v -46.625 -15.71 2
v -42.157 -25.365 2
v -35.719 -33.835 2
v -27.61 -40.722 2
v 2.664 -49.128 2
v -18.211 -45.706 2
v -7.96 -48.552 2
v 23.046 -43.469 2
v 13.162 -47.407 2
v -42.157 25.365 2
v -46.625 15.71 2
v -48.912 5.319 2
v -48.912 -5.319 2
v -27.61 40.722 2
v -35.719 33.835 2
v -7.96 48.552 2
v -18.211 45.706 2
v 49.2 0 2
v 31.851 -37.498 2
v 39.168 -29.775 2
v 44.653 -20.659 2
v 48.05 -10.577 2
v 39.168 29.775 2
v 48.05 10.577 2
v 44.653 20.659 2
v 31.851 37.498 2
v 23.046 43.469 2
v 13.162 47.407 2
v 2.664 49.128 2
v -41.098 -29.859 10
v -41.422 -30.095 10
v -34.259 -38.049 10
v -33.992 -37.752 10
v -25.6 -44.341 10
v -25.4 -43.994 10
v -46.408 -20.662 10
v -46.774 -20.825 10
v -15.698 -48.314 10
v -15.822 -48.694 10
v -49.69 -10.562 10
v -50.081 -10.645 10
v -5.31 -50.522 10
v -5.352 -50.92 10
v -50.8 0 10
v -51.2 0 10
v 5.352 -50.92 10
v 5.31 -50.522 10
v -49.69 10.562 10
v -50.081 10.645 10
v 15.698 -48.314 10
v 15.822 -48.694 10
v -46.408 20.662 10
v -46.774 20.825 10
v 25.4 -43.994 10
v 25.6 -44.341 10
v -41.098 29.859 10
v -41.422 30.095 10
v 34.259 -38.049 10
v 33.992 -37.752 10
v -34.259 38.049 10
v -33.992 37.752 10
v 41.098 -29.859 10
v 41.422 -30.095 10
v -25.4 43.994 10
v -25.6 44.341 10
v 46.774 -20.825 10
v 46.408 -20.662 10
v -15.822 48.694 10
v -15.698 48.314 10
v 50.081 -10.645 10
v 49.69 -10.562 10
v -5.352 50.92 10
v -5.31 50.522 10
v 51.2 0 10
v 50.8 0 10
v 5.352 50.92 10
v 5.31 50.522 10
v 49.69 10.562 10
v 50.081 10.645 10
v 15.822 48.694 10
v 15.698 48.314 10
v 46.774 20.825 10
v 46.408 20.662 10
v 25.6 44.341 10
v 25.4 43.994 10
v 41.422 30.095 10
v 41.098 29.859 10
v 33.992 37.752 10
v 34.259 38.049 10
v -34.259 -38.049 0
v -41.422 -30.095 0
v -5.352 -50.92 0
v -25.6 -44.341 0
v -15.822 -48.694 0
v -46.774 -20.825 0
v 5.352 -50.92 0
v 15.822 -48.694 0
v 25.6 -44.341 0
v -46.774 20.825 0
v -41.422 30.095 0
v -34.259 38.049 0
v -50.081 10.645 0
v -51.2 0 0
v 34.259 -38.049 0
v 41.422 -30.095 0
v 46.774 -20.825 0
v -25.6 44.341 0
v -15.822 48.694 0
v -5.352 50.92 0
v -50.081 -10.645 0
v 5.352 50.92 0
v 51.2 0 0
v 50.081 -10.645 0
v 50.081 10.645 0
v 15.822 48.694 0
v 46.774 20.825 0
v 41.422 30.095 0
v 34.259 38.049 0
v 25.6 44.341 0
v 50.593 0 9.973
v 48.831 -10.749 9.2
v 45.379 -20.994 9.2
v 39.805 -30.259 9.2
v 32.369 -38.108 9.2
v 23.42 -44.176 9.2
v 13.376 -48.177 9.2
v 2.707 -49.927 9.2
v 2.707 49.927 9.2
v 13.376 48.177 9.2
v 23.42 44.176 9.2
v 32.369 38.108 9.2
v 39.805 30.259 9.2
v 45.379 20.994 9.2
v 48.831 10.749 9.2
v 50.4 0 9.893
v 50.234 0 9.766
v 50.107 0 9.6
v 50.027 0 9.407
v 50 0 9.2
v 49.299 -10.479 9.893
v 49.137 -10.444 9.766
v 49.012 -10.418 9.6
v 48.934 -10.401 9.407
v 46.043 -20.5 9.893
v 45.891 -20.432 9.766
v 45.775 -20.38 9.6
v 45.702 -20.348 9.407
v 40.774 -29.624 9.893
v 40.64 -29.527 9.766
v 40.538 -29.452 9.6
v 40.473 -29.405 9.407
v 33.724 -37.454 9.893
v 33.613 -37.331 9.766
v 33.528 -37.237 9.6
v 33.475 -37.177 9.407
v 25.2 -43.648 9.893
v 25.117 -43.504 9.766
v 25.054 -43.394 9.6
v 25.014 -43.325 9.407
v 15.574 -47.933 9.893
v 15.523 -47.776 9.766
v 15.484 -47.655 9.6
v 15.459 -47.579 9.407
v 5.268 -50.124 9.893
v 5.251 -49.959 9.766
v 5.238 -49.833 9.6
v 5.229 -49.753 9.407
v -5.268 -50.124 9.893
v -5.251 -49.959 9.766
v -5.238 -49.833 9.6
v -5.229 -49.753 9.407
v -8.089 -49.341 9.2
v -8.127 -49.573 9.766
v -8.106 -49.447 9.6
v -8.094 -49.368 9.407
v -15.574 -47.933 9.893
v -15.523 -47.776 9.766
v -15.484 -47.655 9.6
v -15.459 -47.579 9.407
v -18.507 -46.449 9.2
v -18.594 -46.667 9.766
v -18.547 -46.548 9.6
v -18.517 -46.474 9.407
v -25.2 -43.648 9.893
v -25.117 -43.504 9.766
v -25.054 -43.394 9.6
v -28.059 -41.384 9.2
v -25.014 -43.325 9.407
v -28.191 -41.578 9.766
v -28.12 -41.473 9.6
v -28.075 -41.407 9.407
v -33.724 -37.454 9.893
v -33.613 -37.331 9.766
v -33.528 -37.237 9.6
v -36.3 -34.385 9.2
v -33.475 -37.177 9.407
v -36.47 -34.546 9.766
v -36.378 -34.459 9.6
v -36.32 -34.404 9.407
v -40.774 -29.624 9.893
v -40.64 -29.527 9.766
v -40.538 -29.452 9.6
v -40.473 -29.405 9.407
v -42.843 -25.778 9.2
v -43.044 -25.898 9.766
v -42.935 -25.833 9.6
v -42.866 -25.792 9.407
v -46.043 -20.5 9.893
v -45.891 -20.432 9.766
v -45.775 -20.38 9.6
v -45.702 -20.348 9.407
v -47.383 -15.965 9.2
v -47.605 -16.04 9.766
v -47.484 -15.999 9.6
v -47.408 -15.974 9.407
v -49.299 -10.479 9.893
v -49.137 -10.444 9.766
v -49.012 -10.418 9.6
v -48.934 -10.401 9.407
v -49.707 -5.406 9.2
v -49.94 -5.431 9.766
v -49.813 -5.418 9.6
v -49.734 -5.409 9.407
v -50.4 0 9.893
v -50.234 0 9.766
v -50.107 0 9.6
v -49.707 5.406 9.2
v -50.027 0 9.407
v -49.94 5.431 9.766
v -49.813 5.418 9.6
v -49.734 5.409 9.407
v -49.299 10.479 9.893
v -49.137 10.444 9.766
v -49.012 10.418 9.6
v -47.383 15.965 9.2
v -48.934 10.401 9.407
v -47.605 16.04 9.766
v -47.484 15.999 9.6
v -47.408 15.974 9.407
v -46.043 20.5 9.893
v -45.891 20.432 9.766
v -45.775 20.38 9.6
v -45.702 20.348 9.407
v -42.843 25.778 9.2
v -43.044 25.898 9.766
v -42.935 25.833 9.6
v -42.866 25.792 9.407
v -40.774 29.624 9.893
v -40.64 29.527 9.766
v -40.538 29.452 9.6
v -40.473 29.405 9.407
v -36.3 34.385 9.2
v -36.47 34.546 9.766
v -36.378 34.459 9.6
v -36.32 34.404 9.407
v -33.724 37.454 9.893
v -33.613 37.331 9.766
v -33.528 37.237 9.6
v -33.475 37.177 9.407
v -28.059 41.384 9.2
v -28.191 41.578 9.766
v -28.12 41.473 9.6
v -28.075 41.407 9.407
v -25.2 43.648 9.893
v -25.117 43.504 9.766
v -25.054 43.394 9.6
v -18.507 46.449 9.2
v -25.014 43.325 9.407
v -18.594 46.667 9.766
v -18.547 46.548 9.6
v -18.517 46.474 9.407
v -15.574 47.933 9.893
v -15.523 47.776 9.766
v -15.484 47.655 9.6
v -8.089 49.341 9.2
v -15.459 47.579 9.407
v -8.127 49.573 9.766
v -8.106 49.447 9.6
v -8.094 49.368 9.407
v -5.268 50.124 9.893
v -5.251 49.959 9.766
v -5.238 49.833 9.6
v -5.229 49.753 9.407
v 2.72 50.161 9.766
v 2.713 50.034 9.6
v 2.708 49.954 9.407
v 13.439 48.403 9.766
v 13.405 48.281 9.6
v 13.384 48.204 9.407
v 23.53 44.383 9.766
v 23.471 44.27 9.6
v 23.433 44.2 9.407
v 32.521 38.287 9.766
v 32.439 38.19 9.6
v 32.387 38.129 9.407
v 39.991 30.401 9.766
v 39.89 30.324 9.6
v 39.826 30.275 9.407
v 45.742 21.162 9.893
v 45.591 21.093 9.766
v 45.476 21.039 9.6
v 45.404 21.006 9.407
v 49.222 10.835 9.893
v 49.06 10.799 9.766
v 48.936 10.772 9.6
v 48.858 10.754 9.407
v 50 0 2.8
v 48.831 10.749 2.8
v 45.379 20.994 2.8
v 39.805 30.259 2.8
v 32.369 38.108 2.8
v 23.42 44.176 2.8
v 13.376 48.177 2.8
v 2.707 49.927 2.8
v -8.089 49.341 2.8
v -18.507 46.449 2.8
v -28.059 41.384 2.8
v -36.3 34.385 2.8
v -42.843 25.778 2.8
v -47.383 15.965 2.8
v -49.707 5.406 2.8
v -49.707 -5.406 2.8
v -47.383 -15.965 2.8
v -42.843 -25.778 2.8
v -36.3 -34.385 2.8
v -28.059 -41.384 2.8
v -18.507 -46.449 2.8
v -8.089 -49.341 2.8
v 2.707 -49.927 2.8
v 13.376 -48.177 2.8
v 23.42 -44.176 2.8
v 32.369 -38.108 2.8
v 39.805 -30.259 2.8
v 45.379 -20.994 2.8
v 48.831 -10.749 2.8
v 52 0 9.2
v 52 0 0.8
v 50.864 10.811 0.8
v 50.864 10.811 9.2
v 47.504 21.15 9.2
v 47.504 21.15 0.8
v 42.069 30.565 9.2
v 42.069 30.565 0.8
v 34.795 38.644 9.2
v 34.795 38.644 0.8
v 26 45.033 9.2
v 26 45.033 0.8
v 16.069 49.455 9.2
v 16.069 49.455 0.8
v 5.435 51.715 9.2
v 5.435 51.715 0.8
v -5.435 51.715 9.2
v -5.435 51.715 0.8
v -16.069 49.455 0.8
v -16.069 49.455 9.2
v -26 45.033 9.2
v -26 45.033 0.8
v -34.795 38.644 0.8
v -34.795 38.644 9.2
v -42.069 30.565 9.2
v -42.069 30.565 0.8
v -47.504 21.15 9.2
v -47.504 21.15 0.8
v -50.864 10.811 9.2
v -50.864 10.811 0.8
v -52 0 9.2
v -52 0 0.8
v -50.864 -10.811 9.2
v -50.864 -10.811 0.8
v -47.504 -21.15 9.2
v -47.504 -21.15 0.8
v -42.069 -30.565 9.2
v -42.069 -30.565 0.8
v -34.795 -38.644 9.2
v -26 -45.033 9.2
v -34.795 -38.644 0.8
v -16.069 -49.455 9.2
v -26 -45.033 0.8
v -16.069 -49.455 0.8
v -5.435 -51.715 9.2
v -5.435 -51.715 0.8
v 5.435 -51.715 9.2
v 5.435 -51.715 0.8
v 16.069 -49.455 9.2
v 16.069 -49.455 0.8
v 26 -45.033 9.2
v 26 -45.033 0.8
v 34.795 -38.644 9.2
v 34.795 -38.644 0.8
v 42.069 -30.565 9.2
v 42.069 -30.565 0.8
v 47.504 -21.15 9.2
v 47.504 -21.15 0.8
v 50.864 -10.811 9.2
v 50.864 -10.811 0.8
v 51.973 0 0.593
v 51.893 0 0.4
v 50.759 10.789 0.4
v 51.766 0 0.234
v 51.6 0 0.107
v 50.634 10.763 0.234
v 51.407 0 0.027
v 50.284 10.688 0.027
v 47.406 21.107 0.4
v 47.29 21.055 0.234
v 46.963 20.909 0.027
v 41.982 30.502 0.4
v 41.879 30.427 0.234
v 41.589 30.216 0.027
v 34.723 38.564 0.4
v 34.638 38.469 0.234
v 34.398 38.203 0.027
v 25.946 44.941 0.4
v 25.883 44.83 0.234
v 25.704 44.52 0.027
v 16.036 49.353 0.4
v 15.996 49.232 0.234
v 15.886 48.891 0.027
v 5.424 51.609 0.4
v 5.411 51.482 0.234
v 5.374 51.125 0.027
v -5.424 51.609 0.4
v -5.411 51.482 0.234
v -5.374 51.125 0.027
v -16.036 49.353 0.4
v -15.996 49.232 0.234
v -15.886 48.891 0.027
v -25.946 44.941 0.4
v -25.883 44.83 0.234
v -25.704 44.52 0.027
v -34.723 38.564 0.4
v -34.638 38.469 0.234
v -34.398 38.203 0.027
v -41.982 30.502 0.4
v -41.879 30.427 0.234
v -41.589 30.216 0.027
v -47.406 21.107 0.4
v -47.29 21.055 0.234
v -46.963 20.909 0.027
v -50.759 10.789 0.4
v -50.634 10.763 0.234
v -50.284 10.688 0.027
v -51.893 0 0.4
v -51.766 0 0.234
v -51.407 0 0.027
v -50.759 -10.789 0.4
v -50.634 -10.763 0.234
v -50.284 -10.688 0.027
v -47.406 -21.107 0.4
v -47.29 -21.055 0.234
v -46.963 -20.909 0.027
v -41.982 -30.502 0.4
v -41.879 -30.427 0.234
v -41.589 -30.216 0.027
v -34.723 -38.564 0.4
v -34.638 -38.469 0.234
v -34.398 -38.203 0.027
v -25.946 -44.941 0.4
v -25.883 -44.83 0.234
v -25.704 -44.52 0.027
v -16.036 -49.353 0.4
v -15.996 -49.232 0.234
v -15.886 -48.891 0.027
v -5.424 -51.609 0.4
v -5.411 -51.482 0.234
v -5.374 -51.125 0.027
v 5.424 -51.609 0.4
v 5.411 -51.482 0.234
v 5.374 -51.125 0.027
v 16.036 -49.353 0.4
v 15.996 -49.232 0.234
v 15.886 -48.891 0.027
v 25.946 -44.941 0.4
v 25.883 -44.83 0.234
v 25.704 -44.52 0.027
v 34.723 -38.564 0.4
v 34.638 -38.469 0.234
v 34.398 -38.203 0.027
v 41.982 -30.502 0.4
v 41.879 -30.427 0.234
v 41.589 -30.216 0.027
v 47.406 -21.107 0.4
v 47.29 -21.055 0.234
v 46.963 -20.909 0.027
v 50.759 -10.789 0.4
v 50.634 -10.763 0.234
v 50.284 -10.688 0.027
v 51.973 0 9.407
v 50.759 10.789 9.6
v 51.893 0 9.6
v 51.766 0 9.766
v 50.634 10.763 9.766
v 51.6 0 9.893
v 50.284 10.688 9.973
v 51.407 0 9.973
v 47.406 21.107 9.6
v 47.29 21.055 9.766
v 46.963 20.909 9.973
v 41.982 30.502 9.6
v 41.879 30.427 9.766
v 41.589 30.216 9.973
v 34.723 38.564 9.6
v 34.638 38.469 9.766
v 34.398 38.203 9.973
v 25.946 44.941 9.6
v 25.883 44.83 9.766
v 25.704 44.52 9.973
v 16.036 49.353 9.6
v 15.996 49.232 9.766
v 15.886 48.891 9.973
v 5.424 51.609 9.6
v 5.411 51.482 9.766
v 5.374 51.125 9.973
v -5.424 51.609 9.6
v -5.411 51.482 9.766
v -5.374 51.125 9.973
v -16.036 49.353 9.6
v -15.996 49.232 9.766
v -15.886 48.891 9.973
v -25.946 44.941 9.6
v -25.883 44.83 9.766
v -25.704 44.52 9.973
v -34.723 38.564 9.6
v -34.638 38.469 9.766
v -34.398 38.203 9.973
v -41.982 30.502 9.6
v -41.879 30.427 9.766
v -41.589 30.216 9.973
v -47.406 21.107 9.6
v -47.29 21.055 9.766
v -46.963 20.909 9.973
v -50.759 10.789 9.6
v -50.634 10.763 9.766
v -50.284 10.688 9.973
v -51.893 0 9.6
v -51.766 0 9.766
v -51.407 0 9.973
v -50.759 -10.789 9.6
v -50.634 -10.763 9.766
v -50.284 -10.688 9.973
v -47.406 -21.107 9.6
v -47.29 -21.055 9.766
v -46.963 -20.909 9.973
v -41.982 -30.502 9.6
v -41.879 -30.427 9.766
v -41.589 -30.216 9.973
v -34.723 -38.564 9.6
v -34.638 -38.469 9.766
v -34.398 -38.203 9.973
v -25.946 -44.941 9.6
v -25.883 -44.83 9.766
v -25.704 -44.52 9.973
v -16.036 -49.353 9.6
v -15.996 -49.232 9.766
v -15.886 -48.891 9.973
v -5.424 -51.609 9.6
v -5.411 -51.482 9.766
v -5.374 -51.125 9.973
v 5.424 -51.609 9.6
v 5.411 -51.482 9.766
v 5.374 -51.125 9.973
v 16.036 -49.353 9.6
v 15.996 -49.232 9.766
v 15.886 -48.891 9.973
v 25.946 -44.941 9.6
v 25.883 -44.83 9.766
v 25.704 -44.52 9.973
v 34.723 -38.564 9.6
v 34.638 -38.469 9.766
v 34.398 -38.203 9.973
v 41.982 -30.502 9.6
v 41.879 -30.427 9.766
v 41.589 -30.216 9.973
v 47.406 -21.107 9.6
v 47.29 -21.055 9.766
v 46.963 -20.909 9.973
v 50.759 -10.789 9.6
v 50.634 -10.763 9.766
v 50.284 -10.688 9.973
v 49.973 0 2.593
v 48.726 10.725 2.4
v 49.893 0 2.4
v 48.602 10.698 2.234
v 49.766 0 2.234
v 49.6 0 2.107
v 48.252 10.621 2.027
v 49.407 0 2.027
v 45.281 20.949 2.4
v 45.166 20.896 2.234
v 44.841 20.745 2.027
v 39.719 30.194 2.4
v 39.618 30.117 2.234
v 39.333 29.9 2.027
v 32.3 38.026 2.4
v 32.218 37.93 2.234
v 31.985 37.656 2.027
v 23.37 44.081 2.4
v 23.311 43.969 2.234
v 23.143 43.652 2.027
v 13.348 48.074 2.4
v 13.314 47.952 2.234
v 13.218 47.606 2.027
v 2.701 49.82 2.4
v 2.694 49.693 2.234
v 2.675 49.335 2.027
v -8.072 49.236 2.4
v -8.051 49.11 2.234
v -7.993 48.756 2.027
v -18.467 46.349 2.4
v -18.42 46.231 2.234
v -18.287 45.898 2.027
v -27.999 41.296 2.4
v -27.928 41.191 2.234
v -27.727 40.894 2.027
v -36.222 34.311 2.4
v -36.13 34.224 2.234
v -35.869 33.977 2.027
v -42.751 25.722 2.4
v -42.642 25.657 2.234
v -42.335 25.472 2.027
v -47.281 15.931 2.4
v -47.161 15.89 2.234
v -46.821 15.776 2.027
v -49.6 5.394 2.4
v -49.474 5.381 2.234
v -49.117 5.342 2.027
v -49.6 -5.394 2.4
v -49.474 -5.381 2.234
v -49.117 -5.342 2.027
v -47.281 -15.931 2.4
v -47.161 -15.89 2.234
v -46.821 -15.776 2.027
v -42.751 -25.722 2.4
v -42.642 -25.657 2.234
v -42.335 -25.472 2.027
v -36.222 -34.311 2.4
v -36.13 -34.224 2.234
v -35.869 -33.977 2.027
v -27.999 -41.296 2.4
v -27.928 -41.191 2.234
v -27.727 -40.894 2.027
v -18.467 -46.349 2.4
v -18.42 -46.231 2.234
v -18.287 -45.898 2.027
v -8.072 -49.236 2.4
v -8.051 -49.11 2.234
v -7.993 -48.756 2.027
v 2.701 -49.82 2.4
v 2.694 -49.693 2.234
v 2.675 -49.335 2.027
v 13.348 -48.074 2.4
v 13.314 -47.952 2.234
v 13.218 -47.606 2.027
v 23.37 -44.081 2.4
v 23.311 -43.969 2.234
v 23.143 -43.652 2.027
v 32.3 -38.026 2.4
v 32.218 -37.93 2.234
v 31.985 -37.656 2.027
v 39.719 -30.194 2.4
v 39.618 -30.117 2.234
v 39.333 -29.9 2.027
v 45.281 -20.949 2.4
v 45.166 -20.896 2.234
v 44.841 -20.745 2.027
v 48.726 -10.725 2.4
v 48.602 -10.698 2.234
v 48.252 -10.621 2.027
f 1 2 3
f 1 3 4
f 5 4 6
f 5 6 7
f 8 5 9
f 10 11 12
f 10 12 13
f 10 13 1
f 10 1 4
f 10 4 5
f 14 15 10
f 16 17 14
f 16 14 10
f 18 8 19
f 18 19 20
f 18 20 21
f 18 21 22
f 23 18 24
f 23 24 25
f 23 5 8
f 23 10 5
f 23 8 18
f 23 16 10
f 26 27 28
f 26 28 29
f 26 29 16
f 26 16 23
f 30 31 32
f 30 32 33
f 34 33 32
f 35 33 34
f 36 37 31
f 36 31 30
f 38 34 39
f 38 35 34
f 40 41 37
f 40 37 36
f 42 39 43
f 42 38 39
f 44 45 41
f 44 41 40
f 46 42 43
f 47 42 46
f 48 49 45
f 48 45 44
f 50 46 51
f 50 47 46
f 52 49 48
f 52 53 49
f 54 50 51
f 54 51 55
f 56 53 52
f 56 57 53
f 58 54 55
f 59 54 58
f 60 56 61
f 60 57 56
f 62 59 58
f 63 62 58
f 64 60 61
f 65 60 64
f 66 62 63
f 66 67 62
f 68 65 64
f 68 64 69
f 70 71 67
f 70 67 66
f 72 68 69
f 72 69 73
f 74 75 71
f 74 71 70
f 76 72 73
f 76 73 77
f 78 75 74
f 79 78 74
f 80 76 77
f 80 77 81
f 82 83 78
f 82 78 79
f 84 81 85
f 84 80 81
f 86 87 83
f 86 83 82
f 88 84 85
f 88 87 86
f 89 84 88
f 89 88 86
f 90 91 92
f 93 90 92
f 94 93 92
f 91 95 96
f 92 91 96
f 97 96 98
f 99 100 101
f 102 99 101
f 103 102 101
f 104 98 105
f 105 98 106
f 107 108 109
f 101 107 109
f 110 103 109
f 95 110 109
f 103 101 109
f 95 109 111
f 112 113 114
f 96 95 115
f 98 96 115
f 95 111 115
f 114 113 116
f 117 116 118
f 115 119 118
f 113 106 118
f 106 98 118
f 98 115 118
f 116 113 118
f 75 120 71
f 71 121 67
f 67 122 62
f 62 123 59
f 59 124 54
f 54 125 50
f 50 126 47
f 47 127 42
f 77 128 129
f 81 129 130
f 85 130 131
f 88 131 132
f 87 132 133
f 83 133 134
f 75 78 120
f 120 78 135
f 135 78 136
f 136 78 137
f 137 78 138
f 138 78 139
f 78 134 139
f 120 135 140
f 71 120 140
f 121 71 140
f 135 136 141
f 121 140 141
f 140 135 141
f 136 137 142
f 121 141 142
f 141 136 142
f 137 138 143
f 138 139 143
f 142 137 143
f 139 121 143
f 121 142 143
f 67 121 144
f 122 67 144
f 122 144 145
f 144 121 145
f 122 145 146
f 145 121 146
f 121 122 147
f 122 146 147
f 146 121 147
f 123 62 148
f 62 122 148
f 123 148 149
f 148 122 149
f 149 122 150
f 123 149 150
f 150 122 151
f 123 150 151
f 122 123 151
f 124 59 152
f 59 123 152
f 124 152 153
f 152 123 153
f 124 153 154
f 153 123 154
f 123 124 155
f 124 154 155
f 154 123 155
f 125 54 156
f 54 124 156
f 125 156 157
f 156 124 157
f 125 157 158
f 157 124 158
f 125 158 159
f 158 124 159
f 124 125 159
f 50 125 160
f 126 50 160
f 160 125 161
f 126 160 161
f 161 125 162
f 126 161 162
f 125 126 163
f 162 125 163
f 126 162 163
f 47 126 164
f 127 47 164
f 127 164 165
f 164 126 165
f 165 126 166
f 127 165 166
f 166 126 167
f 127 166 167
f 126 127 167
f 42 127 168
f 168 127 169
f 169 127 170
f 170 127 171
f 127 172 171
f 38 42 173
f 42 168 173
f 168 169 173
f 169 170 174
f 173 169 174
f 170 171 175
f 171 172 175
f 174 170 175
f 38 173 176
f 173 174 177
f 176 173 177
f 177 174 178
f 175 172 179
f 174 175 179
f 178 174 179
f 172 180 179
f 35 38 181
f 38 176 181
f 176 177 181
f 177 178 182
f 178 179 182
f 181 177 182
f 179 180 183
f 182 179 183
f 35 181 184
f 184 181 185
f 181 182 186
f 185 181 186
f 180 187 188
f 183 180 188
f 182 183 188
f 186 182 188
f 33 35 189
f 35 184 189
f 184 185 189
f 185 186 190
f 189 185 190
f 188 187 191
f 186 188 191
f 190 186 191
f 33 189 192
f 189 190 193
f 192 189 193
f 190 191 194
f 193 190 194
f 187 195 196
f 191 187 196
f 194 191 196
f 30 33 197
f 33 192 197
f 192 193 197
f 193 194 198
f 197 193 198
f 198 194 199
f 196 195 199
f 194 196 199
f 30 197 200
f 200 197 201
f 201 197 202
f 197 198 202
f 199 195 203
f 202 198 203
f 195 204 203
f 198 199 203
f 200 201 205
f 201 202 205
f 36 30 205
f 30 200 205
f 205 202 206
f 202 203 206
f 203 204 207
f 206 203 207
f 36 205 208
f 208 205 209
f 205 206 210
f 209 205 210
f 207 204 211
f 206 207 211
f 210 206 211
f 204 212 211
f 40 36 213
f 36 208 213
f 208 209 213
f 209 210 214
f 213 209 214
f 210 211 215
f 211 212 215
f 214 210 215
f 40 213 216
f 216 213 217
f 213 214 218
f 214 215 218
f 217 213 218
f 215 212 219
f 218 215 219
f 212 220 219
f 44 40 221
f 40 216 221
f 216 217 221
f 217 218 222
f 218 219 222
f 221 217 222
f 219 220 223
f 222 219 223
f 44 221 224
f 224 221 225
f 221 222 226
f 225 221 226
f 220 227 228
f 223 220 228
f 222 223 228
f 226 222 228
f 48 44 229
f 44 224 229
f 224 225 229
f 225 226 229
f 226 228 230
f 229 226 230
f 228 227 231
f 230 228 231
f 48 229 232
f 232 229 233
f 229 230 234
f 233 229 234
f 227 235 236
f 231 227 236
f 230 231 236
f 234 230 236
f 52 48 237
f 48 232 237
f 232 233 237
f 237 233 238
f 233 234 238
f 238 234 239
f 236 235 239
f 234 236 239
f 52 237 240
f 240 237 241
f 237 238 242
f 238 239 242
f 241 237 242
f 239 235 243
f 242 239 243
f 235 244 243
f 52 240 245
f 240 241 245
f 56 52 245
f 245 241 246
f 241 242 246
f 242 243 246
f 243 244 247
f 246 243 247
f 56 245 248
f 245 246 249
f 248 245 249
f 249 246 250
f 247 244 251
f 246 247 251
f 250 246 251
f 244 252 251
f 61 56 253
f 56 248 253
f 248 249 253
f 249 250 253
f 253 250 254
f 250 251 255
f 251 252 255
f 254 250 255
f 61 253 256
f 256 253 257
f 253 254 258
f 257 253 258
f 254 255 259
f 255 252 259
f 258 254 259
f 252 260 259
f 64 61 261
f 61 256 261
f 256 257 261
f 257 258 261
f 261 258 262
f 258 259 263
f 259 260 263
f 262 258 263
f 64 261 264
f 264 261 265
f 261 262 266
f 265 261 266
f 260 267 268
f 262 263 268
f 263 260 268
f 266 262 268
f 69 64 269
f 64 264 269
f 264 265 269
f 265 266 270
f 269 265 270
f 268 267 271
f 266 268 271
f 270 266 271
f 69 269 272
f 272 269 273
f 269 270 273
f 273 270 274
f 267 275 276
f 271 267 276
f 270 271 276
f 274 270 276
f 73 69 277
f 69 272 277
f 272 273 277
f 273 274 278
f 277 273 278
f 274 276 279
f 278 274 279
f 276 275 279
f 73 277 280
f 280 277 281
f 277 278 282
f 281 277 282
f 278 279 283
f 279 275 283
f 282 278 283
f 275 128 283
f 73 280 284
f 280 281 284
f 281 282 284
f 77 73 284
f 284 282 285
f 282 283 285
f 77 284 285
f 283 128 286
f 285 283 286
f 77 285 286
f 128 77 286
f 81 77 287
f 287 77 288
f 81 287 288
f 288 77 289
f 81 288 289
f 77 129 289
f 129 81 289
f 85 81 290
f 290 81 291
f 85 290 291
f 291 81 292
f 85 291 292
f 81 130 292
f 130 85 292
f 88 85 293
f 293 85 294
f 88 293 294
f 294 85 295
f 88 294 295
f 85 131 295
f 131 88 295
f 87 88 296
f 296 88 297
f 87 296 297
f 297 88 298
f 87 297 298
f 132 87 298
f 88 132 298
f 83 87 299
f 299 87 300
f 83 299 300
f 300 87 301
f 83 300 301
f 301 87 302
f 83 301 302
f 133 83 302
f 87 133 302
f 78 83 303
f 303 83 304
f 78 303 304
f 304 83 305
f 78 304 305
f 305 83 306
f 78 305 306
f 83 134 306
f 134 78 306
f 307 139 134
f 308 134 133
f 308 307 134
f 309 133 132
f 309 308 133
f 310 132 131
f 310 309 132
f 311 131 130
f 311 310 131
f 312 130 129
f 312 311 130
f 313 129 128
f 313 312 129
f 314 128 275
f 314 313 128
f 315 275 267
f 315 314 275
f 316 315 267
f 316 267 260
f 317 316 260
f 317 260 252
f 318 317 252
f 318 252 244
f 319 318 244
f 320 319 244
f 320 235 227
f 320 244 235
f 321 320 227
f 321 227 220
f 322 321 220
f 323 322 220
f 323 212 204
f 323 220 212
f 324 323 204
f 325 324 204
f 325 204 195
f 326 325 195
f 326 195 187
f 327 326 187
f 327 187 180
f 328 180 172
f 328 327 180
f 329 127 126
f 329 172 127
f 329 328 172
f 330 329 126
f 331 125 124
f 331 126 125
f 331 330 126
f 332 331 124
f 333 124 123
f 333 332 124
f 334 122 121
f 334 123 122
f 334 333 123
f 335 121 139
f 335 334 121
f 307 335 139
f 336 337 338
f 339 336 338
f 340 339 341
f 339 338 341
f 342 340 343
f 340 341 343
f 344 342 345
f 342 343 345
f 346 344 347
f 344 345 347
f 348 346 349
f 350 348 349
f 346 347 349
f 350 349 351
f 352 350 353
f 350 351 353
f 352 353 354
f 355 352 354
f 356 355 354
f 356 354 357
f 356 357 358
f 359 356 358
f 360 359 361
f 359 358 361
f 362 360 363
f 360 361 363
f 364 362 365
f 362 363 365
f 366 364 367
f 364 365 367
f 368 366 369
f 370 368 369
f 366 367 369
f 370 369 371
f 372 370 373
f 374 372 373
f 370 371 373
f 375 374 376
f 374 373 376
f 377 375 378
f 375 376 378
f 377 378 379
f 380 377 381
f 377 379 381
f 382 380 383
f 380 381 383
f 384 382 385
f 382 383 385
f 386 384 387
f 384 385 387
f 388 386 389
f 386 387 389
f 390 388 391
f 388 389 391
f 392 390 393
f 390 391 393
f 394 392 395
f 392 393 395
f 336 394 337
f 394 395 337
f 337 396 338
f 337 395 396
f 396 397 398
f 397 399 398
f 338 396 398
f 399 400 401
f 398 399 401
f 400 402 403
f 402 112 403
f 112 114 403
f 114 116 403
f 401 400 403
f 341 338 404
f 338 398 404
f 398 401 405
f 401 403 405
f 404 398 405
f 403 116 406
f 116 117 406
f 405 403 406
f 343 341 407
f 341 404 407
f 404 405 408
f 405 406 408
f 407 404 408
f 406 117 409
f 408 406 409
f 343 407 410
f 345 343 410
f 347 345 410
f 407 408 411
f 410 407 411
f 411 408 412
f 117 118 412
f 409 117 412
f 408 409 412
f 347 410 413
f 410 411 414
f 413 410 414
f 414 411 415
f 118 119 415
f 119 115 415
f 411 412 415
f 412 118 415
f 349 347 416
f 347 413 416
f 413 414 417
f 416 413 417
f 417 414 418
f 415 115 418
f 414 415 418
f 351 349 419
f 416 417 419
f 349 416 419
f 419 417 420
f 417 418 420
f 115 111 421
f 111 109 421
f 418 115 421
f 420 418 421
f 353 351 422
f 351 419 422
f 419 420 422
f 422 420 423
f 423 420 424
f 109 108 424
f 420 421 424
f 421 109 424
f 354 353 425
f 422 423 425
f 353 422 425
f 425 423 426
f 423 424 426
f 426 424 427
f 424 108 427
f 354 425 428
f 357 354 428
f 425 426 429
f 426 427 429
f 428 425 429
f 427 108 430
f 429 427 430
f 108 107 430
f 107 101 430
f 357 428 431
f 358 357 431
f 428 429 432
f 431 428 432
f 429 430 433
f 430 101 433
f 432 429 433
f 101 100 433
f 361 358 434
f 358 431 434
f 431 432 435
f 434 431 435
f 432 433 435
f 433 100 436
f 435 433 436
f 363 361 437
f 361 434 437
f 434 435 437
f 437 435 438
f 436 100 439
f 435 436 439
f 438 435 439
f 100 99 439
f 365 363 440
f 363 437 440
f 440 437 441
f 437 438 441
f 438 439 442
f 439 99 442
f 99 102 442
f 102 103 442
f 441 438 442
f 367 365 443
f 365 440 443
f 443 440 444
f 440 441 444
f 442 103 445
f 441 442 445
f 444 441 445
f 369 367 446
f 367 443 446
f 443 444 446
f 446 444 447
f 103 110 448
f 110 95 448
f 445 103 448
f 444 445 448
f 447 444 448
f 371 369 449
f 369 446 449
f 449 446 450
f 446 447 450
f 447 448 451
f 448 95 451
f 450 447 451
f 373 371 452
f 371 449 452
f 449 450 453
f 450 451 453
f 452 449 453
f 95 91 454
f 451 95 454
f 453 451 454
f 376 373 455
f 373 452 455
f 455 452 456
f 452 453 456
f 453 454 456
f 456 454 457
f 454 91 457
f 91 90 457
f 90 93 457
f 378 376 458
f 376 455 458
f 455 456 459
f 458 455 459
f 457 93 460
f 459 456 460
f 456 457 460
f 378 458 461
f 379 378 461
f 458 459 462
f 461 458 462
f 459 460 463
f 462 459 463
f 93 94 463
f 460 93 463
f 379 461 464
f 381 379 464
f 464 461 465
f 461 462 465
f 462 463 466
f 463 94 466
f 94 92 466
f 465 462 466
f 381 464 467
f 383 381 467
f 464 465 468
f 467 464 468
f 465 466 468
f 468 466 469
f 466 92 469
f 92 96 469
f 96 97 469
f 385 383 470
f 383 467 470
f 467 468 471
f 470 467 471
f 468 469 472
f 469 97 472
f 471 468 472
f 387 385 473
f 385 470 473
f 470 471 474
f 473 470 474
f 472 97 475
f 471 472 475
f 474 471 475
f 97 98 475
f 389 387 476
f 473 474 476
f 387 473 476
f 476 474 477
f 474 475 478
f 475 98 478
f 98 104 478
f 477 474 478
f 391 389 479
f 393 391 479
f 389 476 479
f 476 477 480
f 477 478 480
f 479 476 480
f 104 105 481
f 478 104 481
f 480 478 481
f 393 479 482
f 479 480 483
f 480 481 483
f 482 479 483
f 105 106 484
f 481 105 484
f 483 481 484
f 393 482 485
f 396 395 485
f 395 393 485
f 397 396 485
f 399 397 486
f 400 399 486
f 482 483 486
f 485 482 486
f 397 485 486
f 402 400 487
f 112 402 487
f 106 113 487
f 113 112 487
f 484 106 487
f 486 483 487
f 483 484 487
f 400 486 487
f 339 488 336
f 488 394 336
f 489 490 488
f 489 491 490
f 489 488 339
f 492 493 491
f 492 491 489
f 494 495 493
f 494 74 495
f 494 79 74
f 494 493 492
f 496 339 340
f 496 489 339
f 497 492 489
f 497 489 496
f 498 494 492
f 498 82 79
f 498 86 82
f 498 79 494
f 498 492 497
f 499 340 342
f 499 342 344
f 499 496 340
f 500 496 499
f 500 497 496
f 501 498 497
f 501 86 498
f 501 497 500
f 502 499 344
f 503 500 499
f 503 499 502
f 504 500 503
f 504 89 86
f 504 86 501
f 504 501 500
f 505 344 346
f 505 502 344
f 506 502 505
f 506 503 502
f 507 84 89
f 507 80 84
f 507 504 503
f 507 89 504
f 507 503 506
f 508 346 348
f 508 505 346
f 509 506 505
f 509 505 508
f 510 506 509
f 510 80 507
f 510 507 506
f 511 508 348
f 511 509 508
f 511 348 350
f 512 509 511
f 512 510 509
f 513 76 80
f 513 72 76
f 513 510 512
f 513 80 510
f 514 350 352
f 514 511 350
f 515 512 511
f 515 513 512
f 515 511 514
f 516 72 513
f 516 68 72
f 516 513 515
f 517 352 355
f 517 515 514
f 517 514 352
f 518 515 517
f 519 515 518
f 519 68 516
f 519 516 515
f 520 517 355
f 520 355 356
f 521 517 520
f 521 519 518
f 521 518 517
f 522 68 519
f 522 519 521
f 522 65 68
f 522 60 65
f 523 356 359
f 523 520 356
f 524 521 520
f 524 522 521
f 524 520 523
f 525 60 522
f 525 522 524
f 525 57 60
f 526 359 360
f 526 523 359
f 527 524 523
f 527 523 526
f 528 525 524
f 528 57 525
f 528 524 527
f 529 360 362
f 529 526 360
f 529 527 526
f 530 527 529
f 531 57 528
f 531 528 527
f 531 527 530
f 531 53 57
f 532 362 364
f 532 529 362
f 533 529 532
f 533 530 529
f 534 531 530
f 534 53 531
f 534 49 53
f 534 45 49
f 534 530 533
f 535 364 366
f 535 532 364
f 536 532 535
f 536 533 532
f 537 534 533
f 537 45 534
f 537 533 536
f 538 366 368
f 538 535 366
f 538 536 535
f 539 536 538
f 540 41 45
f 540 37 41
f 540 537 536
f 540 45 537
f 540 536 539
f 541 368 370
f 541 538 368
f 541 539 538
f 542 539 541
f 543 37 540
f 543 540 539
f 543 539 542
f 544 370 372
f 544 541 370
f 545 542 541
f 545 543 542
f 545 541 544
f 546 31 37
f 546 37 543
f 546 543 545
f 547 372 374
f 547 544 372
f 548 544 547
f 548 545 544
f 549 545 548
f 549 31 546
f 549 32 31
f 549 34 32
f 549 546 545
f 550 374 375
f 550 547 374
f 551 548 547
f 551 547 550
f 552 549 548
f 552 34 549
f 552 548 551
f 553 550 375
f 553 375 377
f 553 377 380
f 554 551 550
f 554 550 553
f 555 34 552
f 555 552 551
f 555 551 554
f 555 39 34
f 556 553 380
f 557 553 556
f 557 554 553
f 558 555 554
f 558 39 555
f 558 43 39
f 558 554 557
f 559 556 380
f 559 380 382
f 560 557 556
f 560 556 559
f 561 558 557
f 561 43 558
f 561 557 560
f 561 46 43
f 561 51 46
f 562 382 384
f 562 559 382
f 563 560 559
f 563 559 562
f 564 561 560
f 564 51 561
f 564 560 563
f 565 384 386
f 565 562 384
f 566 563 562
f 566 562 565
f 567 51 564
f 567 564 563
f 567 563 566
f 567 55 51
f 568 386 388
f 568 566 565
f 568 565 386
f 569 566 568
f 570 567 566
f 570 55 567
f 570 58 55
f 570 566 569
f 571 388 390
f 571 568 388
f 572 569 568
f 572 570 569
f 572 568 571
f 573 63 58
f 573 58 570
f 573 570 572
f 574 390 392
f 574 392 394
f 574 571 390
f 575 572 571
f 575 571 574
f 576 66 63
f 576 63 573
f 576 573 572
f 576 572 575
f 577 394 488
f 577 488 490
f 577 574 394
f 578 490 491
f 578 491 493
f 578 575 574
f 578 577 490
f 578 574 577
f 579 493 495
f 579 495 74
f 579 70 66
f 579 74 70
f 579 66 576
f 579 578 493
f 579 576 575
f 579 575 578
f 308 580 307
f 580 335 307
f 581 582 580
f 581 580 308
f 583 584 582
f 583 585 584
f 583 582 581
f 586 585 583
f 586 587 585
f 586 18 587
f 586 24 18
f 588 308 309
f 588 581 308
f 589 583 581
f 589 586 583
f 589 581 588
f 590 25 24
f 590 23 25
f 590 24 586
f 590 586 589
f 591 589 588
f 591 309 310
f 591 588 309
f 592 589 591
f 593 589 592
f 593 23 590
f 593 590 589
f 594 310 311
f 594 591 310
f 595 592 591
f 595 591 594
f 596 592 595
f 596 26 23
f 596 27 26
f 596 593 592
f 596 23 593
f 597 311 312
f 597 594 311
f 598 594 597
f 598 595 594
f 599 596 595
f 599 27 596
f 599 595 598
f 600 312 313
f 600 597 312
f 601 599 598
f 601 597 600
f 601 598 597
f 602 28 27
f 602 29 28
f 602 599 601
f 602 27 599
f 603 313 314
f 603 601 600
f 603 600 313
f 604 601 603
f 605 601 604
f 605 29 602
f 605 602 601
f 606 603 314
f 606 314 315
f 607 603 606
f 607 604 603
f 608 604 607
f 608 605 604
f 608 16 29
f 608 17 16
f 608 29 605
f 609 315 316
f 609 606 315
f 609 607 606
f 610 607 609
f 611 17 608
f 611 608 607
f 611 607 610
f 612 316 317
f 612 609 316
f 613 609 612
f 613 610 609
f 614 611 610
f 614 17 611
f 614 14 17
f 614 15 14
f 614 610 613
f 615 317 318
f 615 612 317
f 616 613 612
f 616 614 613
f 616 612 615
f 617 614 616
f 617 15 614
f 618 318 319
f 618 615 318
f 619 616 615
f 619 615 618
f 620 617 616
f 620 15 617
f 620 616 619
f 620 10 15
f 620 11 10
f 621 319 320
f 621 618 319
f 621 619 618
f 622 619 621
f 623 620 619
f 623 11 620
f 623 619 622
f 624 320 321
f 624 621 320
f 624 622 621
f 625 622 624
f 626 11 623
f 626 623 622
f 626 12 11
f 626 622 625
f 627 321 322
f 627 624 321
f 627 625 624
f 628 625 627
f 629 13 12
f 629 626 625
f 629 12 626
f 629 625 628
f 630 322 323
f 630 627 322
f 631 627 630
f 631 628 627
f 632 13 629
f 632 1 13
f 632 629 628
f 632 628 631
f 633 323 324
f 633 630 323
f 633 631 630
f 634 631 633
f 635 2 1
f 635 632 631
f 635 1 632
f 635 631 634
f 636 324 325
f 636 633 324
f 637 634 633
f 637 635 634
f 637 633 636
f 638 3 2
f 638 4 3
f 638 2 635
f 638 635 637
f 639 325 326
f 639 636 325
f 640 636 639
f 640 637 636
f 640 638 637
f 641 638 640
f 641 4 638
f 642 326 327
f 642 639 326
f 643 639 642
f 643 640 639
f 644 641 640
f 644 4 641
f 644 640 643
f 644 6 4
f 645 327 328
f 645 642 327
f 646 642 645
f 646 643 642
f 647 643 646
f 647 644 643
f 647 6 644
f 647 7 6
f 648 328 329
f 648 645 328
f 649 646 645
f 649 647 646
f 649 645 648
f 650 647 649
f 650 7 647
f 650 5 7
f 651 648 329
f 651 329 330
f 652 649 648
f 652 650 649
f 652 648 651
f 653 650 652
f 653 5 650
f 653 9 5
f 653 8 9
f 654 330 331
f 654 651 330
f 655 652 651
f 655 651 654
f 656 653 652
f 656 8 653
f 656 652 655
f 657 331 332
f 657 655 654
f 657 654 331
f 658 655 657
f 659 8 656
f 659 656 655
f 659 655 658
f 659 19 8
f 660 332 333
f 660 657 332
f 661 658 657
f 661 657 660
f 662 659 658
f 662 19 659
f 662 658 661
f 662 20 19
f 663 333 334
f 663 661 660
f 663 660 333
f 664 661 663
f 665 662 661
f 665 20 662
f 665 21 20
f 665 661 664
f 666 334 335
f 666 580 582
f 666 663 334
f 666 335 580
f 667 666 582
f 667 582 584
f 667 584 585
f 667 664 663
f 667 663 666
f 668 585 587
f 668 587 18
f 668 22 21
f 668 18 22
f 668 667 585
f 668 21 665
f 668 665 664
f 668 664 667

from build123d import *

# Parameters (mm, degrees)
CYLINDER001_R     = 50
CYLINDER001_DEPTH = 10
CYLINDER_R        = 52
CYLINDER_DEPTH    = 10
FILLET_R          = 0.8


with BuildPart() as cylinder001:
    # Cylinder001 → Cylinder001 (new body)
    with BuildSketch(Plane.XY.offset(2)):
        Circle(CYLINDER001_R)
    extrude(amount=CYLINDER001_DEPTH)


with BuildPart() as fillet_body:
    # Cylinder → Cylinder (new body)
    with BuildSketch(Plane.XY):
        Circle(CYLINDER_R)
    extrude(amount=CYLINDER_DEPTH)

    # Cut: cut Cylinder001
    add(cylinder001.part, mode=Mode.SUBTRACT)

    # Fillet
    fillet_edges = [fillet_body.edges().sort_by_distance(p)[0] for p in [
        (-52, 0, 10),
        (-52, 0, 0),
        (-50, 0, 10),
        (-50, 0, 2),
    ]]
    fillet(fillet_edges, radius=FILLET_R)


solid = fillet_body.part
